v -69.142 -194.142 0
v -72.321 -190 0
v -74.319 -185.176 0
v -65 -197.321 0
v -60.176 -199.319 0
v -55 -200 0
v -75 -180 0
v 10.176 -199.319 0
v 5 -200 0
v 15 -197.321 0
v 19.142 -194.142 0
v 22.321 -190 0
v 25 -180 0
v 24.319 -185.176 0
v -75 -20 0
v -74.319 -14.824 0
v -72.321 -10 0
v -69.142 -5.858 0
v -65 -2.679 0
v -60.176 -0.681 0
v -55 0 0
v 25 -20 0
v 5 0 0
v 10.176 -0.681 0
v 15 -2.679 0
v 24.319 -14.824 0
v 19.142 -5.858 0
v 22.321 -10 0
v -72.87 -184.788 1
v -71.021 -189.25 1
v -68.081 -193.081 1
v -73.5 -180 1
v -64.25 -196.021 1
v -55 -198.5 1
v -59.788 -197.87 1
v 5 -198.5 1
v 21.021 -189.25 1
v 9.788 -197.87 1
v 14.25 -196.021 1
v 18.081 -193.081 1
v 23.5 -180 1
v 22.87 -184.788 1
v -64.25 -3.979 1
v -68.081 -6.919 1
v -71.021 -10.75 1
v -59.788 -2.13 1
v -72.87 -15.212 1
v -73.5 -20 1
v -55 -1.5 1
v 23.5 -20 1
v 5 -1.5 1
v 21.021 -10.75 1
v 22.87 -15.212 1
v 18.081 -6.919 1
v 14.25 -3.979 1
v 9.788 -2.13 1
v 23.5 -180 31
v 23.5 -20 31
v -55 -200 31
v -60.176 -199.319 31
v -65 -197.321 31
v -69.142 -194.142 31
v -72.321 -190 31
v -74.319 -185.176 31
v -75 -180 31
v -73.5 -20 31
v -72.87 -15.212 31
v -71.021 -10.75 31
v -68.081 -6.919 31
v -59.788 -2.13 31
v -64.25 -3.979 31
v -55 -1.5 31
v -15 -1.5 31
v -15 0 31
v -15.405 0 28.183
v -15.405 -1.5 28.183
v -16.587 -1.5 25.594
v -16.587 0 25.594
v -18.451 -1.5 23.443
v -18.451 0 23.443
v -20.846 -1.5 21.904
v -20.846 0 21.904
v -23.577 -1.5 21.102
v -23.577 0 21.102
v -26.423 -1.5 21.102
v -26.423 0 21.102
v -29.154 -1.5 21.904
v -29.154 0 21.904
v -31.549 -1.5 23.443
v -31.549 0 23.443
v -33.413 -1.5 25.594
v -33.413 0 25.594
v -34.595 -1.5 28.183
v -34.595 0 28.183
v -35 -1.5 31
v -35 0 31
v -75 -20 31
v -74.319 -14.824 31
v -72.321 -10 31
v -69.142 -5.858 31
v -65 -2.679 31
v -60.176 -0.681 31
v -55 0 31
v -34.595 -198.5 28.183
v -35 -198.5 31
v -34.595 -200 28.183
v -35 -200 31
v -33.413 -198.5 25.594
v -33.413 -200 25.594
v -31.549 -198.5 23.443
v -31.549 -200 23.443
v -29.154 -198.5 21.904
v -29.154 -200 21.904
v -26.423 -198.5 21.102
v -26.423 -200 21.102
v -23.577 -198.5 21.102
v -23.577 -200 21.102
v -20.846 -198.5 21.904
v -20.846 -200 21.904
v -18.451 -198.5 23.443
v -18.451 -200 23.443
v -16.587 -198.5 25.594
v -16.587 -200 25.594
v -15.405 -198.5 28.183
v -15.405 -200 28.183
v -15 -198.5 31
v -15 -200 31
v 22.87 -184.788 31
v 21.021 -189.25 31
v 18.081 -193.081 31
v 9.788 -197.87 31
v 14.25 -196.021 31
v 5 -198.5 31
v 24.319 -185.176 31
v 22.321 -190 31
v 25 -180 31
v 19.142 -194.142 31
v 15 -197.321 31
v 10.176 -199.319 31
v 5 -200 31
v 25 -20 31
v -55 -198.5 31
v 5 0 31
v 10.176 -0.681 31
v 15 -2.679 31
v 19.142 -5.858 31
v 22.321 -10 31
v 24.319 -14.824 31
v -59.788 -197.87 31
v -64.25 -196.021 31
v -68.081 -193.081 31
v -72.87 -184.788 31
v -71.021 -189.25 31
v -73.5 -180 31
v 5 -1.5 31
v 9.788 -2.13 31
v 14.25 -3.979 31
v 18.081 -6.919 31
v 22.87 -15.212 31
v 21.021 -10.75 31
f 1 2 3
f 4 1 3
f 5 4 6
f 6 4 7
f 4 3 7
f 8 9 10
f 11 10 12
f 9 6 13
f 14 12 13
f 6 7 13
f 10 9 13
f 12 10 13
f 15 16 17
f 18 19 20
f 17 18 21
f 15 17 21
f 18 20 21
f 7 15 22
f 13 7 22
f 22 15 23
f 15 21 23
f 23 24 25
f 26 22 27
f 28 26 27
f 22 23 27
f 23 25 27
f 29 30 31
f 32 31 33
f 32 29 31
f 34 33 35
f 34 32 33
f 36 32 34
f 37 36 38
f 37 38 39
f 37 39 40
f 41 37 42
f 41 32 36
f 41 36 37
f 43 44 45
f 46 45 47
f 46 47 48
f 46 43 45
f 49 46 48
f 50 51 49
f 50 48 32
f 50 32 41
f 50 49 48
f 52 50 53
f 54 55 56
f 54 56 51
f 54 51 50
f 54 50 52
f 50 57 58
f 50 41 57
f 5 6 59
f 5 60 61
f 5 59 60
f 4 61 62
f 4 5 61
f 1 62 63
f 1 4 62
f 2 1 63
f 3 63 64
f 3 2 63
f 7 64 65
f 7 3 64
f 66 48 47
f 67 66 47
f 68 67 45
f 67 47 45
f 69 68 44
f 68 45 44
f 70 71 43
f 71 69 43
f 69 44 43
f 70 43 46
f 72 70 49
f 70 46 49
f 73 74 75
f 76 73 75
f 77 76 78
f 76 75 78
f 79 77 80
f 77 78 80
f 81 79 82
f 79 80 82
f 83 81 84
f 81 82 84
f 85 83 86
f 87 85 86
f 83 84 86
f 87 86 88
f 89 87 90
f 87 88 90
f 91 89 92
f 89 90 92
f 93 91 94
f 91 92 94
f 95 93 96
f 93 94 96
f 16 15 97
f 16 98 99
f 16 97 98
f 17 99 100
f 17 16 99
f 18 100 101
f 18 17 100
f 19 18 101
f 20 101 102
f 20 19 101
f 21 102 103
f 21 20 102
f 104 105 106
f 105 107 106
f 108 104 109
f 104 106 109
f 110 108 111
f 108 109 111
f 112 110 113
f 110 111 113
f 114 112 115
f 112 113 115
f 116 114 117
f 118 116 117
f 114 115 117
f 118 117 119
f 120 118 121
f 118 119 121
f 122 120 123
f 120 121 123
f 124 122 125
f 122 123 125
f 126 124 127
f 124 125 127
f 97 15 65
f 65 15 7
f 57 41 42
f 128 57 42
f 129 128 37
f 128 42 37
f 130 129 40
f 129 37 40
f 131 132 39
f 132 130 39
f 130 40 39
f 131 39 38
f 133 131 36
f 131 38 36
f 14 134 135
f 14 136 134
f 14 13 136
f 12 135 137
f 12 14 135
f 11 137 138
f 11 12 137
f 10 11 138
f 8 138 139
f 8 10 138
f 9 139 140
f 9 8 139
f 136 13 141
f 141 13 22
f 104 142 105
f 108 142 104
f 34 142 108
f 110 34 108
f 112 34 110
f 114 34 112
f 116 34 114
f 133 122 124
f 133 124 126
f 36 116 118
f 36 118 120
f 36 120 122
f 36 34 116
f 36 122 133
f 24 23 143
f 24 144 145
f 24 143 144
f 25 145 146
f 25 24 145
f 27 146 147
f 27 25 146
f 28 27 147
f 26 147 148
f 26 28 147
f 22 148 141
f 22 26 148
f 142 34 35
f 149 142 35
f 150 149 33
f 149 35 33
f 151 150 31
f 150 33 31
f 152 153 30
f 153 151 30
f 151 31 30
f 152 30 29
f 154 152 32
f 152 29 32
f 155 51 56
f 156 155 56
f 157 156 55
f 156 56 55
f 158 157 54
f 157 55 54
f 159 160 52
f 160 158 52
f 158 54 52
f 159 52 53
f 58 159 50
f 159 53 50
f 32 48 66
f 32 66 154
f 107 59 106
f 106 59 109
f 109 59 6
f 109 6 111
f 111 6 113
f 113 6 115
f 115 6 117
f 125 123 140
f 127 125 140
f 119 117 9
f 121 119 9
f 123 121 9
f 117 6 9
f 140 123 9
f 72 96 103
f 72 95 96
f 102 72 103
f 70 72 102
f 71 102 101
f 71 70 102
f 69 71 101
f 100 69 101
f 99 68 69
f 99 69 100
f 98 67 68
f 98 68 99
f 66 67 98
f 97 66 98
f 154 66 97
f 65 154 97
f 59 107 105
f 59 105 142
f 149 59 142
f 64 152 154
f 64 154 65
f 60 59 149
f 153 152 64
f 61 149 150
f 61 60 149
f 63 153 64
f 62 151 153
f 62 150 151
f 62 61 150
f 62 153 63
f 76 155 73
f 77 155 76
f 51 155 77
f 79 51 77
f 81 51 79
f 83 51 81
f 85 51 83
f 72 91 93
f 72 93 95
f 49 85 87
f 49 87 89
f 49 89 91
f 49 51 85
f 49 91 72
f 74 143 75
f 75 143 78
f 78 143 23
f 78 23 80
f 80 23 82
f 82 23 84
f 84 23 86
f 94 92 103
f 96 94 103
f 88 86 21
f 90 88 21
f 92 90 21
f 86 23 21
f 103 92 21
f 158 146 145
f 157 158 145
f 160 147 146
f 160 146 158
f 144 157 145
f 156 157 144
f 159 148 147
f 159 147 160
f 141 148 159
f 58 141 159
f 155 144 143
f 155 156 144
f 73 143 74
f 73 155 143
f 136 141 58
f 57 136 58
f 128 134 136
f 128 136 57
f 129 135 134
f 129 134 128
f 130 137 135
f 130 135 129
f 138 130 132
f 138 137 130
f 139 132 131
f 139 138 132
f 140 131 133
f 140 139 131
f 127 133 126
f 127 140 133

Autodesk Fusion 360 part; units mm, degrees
sketch "Sketch1" plane through (0, 0, 0) normal (0, 0, 1) x (1, 0, 0)
  line L0 (5, 0) -> (-55, 0)
  line L1 (-75, -20) -> (-75, -180)
  line L2 (-55, -200) -> (5, -200)
  line L3 (25, -180) -> (25, -20)
  arc A0 (25, -20) -> (5, 0) centre (5, -20) ccw
  arc A1 (-55, 0) -> (-75, -20) centre (-55, -20) ccw
  arc A2 (5, -200) -> (25, -180) centre (5, -180) ccw
  arc A3 (-75, -180) -> (-55, -200) centre (-55, -180) ccw
  dimension "d1" = 200
  dimension "d2" = 100
  dimension "d3" = 20
extrude "Extrude1" add sketch "Sketch1" along normal blind 1
sketch "Sketch2" plane through (0, 0, 1) normal (0, 0, 1) x (-1, 0, 0)
  arc A0 (75, 180) -> (55, 200) centre (55, 180) ccw
  line L0 (55, 200) -> (-5, 200)
  arc A1 (-5, 200) -> (-25, 180) centre (-5, 180) ccw
  line L1 (-25, 180) -> (-25, 20)
  arc A2 (-25, 20) -> (-5, 0) centre (-5, 20) ccw
  line L2 (-5, 0) -> (55, 0)
  arc A3 (55, 0) -> (75, 20) centre (55, 20) ccw
  line L3 (75, 20) -> (75, 180)
  line L4 (-5, 1.5) -> (55, 1.5)
  arc A4 (55, 1.5) -> (73.5, 20) centre (55, 20) ccw
  line L5 (73.5, 20) -> (73.5, 180)
  arc A5 (73.5, 180) -> (55, 198.5) centre (55, 180) ccw
  line L6 (55, 198.5) -> (-5, 198.5)
  arc A6 (-5, 198.5) -> (-23.5, 180) centre (-5, 180) ccw
  line L7 (-23.5, 180) -> (-23.5, 20)
  arc A7 (-23.5, 20) -> (-5, 1.5) centre (-5, 20) ccw
  dimension "d6" = -1.5
extrude "Extrude2" add sketch "Sketch2" along normal blind 30
sketch "Sketch3" plane through (0, 0, 0) normal (0, 1, 0) x (-1, 0, 0)
  line L0 (-5, 0) -> (55, 0)
  line L1 (55, 0) -> (55, 31)
  line L2 (55, 31) -> (-5, 31)
  line L3 (-5, 31) -> (-5, 0)
  circle A0 centre (25, 31) radius 10
  dimension "d9" = 20
extrude "Extrude3" cut sketch "Sketch3" against normal blind 10 contours L2 A0 picked at (23.7822, 27.8971)
sketch "Sketch4" plane through (0, -200, 0) normal (0, -1, 0) x (1, 0, 0)
  line L0 (-55, 0) -> (5, 0)
  line L1 (5, 0) -> (5, 31)
  line L2 (5, 31) -> (-55, 31)
  line L3 (-55, 31) -> (-55, 0)
  circle A0 centre (-25, 31) radius 10
  dimension "d12" = 20
extrude "Extrude4" cut sketch "Sketch4" against normal blind 10 contours L2 A0 picked at (-26.2178, 27.8971)
